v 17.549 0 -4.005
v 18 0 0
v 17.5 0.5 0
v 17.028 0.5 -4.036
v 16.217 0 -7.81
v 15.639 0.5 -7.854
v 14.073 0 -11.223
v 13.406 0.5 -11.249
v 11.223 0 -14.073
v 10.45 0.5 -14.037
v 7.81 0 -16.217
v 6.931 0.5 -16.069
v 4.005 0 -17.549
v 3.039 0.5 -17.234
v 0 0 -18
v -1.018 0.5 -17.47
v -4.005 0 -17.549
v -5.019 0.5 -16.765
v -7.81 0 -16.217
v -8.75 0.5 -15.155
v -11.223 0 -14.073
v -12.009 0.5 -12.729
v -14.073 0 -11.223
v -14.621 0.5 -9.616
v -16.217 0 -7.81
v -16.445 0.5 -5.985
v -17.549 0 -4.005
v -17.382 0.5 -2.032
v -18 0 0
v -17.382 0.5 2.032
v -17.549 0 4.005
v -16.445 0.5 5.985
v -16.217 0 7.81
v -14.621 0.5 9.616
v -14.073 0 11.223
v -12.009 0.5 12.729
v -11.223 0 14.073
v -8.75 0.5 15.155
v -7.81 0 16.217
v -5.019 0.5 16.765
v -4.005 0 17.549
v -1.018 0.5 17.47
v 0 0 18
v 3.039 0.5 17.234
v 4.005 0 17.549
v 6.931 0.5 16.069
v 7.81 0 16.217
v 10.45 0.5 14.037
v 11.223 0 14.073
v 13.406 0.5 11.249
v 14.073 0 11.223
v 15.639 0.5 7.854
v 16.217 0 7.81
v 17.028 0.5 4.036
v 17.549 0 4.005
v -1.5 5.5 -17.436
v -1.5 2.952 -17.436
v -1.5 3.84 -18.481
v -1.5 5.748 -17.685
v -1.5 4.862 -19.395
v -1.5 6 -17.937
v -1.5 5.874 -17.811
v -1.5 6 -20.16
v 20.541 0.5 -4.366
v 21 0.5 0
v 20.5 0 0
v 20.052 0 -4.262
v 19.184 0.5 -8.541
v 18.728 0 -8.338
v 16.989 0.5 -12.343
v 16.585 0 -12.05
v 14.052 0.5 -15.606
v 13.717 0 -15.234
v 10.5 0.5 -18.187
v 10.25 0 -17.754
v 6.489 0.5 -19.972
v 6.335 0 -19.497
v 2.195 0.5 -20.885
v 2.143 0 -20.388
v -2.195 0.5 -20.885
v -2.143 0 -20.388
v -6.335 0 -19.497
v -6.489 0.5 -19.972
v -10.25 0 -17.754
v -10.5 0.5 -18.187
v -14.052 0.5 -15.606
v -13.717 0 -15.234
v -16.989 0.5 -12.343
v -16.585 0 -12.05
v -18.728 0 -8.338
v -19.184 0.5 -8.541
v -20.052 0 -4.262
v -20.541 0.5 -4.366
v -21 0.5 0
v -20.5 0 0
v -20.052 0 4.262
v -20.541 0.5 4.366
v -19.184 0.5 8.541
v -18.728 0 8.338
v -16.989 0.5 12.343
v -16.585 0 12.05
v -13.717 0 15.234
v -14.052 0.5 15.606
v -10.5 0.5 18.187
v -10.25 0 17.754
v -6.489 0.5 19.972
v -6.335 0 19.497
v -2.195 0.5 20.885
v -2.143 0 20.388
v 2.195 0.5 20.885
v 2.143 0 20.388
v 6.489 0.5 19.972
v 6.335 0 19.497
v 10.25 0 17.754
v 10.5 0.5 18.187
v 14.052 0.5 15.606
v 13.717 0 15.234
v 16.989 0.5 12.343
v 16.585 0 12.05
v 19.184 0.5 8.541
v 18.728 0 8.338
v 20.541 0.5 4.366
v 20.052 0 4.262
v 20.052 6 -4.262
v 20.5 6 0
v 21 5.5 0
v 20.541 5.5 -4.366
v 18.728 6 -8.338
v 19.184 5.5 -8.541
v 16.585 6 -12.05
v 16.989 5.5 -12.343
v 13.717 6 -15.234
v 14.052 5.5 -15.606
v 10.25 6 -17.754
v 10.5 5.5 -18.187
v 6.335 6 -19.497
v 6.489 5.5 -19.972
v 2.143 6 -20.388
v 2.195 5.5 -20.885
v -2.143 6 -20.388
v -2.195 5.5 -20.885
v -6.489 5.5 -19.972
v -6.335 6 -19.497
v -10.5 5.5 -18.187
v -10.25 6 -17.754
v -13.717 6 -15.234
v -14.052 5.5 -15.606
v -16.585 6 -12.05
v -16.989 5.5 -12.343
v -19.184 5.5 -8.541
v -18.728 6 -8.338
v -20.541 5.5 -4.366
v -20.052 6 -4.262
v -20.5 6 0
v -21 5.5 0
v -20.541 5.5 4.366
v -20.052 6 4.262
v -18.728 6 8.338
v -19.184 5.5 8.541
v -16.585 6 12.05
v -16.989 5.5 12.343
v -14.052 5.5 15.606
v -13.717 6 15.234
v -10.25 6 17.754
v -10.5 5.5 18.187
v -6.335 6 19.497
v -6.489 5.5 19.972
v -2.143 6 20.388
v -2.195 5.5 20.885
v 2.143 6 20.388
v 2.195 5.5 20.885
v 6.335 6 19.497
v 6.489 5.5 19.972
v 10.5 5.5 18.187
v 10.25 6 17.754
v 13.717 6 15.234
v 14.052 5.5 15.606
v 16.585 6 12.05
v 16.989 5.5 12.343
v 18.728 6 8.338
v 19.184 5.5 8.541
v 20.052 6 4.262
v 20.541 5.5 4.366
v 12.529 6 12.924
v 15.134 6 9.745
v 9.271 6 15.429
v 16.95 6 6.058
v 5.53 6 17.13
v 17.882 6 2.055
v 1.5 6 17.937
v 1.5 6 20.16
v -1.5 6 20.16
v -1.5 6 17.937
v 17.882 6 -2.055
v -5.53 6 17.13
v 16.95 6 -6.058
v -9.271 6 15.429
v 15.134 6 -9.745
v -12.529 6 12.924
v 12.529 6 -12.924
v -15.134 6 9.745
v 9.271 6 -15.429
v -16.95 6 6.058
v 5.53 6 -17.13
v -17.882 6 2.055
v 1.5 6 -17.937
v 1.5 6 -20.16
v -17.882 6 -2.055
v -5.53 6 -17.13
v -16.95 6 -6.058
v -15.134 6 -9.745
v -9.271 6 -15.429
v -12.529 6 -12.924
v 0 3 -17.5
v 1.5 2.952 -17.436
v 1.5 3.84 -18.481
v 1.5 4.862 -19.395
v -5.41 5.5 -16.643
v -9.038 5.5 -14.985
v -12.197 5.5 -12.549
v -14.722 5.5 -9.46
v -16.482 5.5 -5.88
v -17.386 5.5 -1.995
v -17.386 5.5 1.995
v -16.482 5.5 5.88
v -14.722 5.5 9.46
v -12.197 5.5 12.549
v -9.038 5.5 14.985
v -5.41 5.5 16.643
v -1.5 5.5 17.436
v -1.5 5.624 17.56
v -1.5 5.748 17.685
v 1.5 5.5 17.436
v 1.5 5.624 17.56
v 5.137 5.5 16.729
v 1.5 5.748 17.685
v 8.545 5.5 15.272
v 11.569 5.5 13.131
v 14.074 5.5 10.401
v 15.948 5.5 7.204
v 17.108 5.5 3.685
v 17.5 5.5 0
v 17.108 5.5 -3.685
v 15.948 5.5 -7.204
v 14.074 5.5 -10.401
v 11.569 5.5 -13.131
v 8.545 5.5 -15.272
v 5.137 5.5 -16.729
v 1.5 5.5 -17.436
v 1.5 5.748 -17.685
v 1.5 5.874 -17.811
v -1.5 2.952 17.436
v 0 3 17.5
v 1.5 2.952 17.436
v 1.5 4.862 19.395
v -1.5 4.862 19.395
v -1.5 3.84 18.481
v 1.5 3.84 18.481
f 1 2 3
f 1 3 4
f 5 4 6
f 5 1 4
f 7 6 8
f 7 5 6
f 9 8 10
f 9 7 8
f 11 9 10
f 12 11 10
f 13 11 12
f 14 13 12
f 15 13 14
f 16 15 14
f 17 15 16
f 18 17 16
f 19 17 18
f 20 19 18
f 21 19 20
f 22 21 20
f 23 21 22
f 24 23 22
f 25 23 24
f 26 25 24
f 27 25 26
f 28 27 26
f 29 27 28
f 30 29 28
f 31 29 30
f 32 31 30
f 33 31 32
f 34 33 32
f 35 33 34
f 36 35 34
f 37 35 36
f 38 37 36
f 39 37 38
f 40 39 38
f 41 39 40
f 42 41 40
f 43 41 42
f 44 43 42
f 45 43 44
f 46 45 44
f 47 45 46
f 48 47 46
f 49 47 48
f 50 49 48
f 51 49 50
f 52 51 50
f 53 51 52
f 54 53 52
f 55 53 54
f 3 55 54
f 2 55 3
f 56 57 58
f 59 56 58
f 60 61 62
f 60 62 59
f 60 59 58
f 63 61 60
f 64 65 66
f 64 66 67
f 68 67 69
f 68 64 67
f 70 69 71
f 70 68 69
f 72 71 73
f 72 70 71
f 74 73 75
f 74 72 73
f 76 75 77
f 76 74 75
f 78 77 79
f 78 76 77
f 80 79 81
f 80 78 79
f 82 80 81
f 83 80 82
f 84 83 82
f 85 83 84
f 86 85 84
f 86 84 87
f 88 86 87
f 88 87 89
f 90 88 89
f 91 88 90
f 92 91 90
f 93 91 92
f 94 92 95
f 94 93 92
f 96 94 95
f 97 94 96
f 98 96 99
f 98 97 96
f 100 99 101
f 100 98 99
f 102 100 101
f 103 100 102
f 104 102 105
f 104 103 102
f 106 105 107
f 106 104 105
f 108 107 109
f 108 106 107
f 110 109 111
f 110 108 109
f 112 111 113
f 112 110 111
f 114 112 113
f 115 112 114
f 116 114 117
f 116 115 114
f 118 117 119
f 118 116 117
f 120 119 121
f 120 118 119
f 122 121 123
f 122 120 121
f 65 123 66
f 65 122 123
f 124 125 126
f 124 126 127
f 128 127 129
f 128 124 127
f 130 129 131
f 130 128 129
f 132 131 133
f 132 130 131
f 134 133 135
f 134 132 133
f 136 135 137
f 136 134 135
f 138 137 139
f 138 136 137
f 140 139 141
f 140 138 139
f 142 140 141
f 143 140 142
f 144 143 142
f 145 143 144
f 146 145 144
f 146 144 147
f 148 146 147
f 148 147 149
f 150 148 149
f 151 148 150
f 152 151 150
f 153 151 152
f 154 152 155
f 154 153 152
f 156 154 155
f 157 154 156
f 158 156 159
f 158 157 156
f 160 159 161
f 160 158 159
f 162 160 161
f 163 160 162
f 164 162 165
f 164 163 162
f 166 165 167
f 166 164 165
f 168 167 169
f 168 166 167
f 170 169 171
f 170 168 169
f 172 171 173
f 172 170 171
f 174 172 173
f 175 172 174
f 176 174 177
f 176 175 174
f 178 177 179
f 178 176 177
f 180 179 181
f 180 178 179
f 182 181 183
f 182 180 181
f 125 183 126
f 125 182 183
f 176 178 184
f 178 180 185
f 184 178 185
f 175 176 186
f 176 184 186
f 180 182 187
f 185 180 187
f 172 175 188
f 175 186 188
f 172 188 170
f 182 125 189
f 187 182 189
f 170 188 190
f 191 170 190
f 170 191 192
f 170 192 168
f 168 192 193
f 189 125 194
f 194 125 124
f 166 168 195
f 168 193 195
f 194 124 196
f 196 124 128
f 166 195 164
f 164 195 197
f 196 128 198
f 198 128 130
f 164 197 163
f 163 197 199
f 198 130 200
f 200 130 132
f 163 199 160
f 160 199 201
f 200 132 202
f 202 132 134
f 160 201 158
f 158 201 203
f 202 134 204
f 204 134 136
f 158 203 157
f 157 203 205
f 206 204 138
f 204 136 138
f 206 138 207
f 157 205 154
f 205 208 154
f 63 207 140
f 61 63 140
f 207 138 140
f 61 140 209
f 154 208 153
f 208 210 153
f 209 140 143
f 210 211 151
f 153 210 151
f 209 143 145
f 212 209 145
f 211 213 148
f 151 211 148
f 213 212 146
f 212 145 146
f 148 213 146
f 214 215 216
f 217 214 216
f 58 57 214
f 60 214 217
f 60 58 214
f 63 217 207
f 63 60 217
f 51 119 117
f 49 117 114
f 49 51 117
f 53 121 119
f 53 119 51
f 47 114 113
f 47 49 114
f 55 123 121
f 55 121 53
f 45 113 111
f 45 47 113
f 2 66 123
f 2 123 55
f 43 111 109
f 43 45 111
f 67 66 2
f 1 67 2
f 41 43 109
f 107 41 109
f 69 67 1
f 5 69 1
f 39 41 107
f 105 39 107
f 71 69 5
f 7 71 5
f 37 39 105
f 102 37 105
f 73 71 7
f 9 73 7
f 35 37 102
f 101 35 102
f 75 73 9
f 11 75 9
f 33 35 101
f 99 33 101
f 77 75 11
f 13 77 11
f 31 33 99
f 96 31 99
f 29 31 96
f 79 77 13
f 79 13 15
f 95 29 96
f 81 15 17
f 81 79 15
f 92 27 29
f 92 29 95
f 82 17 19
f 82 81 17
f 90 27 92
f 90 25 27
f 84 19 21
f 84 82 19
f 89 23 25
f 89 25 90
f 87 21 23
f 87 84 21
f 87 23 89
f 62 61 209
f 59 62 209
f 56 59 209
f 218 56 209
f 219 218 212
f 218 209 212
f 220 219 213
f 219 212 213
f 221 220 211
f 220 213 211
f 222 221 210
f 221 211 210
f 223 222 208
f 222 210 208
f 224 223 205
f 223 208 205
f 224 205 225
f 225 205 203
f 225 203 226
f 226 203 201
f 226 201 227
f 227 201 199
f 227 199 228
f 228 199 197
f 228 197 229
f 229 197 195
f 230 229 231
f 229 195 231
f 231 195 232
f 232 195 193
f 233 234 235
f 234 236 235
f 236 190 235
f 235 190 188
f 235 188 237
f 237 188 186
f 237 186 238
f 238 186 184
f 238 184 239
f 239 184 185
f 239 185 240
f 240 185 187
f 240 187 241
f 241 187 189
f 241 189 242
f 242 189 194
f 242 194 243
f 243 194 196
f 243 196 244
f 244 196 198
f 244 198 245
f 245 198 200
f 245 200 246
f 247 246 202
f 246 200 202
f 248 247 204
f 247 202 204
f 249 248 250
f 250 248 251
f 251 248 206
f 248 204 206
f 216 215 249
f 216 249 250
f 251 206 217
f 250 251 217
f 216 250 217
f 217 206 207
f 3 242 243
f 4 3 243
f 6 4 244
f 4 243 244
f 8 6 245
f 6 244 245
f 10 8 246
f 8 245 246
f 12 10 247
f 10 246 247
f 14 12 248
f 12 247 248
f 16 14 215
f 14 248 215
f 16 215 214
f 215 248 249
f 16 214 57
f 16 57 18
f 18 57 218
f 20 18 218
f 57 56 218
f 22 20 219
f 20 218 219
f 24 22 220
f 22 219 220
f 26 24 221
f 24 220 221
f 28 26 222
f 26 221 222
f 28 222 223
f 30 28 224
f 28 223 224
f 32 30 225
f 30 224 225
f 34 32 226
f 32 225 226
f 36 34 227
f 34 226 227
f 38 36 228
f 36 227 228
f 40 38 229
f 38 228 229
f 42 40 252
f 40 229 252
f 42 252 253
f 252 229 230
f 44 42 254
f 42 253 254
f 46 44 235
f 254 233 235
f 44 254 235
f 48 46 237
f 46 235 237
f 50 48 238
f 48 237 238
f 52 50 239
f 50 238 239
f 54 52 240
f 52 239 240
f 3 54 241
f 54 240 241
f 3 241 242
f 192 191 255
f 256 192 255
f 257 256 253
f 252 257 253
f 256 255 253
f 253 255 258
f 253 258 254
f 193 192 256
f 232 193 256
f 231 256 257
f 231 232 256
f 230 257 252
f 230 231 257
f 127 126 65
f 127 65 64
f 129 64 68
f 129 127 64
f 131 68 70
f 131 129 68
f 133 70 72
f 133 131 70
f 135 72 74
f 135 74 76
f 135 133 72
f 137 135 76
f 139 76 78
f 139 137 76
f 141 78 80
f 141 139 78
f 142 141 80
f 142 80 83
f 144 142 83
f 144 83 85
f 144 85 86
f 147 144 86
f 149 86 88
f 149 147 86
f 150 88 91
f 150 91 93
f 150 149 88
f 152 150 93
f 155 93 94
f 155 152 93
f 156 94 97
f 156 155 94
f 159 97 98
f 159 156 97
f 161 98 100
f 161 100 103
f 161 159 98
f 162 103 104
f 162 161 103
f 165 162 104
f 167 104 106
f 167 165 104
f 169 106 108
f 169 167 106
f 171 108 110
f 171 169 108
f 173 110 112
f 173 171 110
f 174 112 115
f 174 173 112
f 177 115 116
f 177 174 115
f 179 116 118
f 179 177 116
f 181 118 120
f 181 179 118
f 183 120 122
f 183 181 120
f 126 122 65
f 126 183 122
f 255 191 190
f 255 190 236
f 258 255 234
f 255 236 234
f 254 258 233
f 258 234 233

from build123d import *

# Parameters (mm, degrees)
SKETCH_2_W               = 3.5
SKETCH_2_H               = 6
CHAMFER_1_SIZE           = 0.5
CUT_EXTRUDE_2_DEPTH      = 1.5
CUT_EXTRUDE_2_DEPTH_BACK = 1.5
SKETCH_4_R               = 10


with BuildPart() as part:
    # Эскиз2 → Повернуть1 (revolve)
    with BuildSketch(Plane.XY):
        with Locations((19.25, 3)):
            Rectangle(SKETCH_2_W, SKETCH_2_H)
    revolve(axis=Axis((0, 0, 0), (0, 1, 0)))

    # Фаска1
    chamfer_1_edges = [part.edges().sort_by_distance(p)[0] for p in [
        (-21, 6, 0),
        (-21, 0, 0),
        (-17.5, 0, 0),
        (-17.5, 6, 0),
    ]]
    chamfer(chamfer_1_edges, length=CHAMFER_1_SIZE)

    # Эскиз4 → Вырез-Вытянуть2 (cut, two sides: drawn at the far end of the back side and taken through both)
    with BuildSketch(Plane(origin=(0, 0, 0), x_dir=(0, 0, -1), z_dir=(1, 0, 0)).offset(-CUT_EXTRUDE_2_DEPTH_BACK)):
        with Locations((-11.5, 11)):
            Circle(SKETCH_4_R)
        with Locations((11.5, 11)):
            Circle(SKETCH_4_R)
    extrude(amount=CUT_EXTRUDE_2_DEPTH + CUT_EXTRUDE_2_DEPTH_BACK, mode=Mode.SUBTRACT)


solid = part.part
